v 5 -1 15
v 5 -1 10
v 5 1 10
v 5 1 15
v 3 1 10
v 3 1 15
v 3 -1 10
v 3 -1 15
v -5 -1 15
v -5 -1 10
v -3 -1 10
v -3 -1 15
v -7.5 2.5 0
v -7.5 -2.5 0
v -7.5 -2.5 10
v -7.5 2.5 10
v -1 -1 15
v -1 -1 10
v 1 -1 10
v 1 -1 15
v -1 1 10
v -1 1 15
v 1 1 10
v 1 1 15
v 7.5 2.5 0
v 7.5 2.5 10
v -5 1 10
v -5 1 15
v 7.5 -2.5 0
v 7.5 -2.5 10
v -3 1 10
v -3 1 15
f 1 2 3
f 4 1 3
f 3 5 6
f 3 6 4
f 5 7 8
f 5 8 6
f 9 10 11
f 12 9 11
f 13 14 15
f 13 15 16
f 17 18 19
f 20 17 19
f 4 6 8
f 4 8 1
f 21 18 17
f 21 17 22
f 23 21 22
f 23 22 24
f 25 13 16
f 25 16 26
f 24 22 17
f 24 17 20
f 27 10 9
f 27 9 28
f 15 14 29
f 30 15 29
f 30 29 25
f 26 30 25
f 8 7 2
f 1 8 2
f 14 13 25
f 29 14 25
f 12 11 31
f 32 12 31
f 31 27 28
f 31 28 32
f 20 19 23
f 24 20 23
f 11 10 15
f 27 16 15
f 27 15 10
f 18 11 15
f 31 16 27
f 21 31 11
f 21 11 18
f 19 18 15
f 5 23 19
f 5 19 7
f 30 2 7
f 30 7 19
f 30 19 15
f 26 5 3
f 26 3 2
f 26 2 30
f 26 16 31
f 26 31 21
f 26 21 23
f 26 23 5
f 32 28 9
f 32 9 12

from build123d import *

# Parameters (mm, degrees)
SKETCH_1_W      = 15
SKETCH_1_H      = 5
EXTRUDE_1_DEPTH = 10
SKETCH_1_3_W    = 2
SKETCH_1_3_H    = 2
EXTRUDE_2_DEPTH = 15


with BuildPart() as part:
    # 草图1 → 凸台-拉伸1 (new body)
    with BuildSketch(Plane.XY):
        Rectangle(SKETCH_1_W, SKETCH_1_H)
    extrude(amount=EXTRUDE_1_DEPTH)

    # 草图1<3> → 凸台-拉伸2 (add)
    with BuildSketch(Plane.XY):
        with Locations((4, 0)):
            Rectangle(SKETCH_1_3_W, SKETCH_1_3_H)
        Rectangle(SKETCH_1_3_W, SKETCH_1_3_H)
        with Locations((-4, 0)):
            Rectangle(SKETCH_1_3_W, SKETCH_1_3_H)
    extrude(amount=EXTRUDE_2_DEPTH)


solid = part.part
